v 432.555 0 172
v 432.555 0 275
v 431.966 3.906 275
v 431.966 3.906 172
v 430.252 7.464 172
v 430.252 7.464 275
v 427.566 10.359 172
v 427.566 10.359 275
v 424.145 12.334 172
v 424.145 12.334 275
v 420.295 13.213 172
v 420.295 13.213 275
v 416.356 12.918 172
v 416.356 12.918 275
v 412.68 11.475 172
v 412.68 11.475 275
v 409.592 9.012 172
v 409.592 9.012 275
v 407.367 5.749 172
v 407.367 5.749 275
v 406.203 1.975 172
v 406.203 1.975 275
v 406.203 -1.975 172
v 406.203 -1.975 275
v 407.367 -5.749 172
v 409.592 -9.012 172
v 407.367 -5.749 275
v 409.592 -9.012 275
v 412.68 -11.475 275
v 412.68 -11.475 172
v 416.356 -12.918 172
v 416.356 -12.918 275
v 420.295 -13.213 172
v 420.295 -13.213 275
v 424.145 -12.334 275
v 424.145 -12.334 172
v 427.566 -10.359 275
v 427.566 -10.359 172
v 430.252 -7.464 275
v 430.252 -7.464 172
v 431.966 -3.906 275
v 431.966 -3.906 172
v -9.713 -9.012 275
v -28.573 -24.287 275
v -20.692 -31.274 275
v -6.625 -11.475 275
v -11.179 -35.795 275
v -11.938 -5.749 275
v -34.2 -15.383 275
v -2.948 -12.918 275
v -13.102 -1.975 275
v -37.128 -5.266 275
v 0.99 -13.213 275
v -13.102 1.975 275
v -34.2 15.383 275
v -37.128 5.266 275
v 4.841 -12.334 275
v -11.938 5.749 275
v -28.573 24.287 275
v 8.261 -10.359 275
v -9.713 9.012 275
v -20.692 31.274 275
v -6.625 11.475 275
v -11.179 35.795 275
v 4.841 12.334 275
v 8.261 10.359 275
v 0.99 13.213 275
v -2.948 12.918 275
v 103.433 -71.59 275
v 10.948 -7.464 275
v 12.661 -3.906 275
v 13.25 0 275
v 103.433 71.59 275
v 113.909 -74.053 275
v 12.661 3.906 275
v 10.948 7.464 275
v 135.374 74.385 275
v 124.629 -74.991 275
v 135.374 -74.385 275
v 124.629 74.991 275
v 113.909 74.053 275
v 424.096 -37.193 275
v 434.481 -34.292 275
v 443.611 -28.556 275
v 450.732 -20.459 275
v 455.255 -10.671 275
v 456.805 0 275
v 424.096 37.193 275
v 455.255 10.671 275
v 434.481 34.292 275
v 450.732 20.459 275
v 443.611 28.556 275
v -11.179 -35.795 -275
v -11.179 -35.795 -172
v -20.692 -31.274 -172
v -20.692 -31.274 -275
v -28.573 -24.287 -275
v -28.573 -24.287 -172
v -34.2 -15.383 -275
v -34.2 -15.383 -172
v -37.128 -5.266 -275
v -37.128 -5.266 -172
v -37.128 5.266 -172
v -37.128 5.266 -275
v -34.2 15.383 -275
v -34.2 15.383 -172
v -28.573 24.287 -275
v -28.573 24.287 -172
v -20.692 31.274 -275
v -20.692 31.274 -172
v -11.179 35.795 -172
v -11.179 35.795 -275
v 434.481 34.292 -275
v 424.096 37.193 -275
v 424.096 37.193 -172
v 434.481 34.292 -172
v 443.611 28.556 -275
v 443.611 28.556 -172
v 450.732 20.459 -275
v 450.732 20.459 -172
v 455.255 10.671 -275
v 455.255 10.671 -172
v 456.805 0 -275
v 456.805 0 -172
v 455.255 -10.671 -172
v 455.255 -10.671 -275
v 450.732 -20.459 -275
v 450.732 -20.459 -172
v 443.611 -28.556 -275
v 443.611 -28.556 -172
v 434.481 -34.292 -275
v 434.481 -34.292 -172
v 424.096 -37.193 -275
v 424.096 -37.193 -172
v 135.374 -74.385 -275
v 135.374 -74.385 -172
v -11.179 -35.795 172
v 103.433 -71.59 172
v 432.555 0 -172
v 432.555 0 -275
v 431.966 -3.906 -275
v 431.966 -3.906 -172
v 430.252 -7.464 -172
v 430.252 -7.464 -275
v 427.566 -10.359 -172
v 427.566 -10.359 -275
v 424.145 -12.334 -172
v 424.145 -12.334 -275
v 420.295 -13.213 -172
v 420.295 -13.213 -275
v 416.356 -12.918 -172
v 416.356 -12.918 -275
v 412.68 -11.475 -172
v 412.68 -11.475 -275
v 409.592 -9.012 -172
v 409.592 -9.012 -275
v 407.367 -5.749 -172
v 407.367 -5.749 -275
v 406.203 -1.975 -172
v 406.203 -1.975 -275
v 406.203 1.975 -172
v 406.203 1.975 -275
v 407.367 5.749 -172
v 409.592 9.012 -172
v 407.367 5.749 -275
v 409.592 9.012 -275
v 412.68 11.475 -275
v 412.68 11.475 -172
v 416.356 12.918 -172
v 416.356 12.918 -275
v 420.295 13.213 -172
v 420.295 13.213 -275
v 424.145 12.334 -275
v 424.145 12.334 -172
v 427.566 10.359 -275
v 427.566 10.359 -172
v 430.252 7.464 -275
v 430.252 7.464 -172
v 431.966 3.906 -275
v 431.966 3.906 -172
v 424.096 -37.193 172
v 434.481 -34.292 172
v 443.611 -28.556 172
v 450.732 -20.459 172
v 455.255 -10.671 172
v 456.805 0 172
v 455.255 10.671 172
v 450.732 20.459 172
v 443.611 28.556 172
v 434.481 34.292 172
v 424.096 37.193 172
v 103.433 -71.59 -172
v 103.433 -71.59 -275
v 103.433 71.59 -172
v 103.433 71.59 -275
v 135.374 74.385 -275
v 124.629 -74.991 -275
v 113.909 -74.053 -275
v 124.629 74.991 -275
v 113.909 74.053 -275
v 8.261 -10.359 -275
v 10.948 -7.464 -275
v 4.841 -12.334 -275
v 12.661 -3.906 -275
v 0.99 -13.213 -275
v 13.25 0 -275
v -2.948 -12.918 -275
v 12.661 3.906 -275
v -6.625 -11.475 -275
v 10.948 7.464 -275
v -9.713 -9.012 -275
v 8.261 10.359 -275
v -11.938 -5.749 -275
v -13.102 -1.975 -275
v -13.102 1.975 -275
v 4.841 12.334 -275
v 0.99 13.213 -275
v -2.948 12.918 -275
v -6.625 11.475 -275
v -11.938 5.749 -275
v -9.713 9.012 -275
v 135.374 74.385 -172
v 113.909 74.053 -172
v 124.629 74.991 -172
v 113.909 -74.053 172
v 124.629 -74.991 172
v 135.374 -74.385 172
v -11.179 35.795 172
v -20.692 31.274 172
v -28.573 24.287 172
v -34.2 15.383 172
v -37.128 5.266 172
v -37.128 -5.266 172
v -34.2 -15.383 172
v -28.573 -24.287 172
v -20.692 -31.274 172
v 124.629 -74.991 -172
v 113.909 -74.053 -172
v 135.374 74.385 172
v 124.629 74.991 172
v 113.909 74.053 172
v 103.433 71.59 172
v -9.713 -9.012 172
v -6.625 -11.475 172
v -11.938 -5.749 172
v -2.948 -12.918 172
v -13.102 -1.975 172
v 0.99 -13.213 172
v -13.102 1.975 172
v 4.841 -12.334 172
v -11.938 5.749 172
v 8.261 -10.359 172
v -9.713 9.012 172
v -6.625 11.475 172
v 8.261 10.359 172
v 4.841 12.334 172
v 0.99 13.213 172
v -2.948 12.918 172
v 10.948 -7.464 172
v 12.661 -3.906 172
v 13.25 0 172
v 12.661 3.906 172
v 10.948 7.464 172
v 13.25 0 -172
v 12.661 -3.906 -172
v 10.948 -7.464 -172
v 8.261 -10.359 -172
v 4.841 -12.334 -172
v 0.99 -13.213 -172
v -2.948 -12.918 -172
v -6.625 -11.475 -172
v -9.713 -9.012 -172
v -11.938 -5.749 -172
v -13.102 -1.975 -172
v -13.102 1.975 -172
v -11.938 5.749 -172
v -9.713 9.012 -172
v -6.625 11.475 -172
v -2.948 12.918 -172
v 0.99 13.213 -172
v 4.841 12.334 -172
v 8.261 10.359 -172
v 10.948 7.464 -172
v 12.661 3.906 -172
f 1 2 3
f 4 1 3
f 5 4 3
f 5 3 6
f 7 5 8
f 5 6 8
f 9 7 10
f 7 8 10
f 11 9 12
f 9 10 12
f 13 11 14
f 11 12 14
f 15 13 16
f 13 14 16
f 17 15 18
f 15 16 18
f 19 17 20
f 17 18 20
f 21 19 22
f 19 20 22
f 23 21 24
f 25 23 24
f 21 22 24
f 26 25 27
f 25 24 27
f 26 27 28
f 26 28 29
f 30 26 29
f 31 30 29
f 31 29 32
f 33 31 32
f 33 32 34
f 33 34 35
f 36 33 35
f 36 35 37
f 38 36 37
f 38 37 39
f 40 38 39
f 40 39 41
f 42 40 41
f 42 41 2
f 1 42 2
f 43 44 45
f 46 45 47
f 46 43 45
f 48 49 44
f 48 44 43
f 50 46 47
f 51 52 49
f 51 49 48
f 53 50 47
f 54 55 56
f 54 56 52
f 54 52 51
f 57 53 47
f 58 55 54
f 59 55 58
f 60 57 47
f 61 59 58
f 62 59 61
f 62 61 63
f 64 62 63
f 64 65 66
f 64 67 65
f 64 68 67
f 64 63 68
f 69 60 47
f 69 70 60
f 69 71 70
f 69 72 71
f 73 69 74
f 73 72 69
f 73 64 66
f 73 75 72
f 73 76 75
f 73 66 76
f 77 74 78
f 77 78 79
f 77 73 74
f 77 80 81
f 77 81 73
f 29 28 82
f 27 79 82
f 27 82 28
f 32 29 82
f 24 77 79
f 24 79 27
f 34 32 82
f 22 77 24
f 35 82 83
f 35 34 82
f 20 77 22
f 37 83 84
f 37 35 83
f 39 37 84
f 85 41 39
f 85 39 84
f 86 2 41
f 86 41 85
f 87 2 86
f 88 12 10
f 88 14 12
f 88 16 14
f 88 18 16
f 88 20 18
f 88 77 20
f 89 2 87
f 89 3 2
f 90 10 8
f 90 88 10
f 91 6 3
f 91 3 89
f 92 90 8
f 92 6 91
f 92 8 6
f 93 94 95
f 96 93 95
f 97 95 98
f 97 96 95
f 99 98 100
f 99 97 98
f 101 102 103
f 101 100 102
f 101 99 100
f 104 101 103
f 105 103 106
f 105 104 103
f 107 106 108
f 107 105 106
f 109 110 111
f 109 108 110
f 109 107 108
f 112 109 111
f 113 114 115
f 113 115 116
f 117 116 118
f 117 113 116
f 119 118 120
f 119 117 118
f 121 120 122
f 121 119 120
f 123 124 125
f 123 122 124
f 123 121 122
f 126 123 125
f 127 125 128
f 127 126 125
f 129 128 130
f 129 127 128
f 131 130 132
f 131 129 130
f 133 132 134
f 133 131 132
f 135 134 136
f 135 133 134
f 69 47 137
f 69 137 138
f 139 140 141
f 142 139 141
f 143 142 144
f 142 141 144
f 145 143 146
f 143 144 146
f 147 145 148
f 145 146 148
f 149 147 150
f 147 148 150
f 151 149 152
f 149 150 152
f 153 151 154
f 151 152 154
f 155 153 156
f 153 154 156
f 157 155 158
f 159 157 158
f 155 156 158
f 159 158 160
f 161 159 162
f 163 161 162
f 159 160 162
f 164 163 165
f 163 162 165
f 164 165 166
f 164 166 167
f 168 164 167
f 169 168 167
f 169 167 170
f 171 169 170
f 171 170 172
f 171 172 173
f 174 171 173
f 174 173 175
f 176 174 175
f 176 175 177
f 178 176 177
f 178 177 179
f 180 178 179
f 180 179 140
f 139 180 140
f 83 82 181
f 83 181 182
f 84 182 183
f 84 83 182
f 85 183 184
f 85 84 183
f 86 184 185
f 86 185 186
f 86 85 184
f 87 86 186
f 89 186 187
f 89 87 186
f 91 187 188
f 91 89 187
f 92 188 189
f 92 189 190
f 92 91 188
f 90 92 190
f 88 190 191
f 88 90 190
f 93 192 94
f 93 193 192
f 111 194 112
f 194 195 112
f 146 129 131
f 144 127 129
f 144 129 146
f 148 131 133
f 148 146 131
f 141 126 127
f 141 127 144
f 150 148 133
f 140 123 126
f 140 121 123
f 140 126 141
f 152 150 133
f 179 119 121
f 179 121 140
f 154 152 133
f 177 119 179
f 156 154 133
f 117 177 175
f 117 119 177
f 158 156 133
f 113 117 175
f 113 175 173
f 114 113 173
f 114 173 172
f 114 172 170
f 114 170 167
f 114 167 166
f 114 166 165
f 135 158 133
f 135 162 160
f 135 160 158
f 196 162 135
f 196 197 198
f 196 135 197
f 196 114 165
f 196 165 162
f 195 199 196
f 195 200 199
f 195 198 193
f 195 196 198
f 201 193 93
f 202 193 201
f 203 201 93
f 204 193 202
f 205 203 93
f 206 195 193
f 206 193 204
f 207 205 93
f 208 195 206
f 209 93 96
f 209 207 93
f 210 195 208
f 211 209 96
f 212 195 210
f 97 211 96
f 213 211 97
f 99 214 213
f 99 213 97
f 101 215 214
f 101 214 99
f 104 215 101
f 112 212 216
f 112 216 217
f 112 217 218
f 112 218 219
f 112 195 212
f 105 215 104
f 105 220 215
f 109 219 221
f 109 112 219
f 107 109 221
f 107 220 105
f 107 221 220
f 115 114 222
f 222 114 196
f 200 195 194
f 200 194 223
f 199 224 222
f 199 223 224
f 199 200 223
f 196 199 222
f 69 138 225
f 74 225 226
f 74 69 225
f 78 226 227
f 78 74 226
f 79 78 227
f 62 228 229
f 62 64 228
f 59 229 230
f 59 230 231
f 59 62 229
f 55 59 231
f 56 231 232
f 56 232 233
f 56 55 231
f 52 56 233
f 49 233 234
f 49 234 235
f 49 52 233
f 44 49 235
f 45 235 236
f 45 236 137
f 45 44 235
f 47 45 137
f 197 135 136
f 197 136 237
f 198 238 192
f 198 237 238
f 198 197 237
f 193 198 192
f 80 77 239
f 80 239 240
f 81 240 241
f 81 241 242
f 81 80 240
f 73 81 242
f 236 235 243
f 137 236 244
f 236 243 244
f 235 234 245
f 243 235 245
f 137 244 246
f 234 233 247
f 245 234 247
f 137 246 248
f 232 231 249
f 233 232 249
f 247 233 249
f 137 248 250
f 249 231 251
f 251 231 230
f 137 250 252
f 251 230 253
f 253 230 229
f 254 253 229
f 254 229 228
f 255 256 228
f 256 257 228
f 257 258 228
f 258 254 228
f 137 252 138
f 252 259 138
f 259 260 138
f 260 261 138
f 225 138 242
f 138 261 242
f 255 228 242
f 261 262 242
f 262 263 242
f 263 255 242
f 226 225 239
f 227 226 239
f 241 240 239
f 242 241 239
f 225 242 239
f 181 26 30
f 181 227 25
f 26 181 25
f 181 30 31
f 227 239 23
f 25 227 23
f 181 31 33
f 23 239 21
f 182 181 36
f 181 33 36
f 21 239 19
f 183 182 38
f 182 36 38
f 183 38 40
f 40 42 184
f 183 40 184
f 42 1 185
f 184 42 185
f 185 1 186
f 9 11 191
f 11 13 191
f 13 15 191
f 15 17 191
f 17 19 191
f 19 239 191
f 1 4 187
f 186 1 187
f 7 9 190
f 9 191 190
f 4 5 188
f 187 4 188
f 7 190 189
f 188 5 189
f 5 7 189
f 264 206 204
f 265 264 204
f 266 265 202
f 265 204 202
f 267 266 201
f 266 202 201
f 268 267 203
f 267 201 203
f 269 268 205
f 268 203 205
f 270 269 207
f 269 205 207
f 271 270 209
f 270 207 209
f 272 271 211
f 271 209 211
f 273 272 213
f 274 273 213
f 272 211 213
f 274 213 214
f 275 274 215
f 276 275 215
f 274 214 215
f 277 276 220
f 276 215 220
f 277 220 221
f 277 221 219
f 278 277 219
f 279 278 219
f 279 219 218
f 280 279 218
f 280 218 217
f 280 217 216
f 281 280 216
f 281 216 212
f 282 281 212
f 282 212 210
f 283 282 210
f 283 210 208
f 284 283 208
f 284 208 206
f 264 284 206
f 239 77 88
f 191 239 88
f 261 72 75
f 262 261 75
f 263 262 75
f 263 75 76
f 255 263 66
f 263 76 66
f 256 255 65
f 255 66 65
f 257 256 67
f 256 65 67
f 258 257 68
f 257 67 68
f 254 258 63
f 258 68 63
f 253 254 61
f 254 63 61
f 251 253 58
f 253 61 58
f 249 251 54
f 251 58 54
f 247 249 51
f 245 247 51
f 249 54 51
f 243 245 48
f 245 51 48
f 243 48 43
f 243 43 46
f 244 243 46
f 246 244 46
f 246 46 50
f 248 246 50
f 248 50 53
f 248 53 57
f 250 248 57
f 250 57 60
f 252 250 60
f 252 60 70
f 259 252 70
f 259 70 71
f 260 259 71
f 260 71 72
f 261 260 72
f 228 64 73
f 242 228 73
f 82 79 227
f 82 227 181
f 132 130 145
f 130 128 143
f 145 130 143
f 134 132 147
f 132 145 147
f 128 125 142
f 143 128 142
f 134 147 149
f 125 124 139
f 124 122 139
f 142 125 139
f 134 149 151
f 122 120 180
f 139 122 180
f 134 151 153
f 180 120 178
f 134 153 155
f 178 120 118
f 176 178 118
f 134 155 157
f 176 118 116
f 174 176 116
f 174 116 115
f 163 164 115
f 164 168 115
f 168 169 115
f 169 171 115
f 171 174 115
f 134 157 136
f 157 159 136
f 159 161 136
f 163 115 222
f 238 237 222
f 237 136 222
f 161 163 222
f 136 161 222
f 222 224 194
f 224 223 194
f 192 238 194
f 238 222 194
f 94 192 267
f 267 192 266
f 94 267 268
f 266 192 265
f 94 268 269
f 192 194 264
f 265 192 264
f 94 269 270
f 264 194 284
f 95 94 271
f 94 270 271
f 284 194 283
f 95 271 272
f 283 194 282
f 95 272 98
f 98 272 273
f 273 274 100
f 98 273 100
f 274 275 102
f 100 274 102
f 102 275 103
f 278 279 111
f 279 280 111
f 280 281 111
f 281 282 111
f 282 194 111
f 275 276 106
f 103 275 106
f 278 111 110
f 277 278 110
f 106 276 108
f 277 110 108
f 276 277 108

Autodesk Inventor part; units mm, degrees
ref_plane "YZ Plane" through (0, 0, 0) normal (1, 0, 0) x (0, 1, 0)
ref_plane "XZ Plane" through (0, 0, 0) normal (0, 1, 0) x (-1, 0, 0)
ref_plane "工作平面1" through (0, 0, 275) normal (0, 0, 1) x (1, 0, 0)
sketch "草圖1" plane through (0, 0, 275) normal (0, 0, 1) x (1, 0, 0)
  line L0 (0, 0) -> (419.3047, 0) construction
  arc A0 (-11.1792, 35.7949) -> (-11.1792, -35.7949) centre (0, 0) ccw
  arc A1 (424.0958, -37.1927) -> (424.0958, 37.1927) centre (419.3047, 0) ccw
  line L1 (-11.1792, -35.7949) -> (103.433, -71.5898)
  line L2 (135.3736, 74.3854) -> (424.0958, 37.1927)
  line L3 (-11.1792, 35.7949) -> (103.433, 71.5898)
  line L4 (135.3736, -74.3854) -> (424.0958, -37.1927)
  arc A2 (103.433, -71.5898) -> (135.3736, -74.3854) centre (125.7914, 0) ccw
  arc A3 (135.3736, 74.3854) -> (103.433, 71.5898) centre (125.7914, 0) ccw
  dimension "d3" = 419.3047
  dimension "d4" = 75
  dimension "d6" = 75
  dimension "d51" = 125.7914
  dimension "d52" = 75
extrude "擠出1" add sketch "草圖1" against normal blind 103
sketch "草圖2" plane through (0, 0, 275) normal (0, 0, 1) x (1, 0, 0)
  arc A0 (-11.1792, 35.7949) -> (-11.1792, -35.7949) centre (0, 0) ccw projected
  circle A1 centre (0, 0) radius 13.25
  arc A2 (424.0958, -37.1927) -> (424.0958, 37.1927) centre (419.3047, 0) ccw projected
  circle A3 centre (419.3047, 0) radius 13.25
  point P0 (-10.9663, -35.8607)
  point P1 (-34.5251, 14.6378)
  point P2 (141.4214, 141.4214)
  point P3 (444.0649, 33.6154)
  point P4 (432.144, -37.2043)
  dimension "d11" = 26.5
  dimension "d13" = 26.5
extrude "擠出2" cut sketch "草圖2" against normal through all
sketch "草圖3" plane through (434.4748, 35.8557, 275) normal (0.1277625, 0.9918048, 0) x (0.9918048, -0.1277625, 0)
  line L0 (-10.4648, 0) -> (-10.4648, 103) projected
  point P0 (-426.3332, 275)
  point P1 (-10.4648, 51.5)
  point P2 (-10.4648, 51.5)
hole "孔1" [suppressed]
sketch "草圖4" plane through (51.2031, 55.2777, 275) normal (-0.2981126, 0.9545307, 0) x (0.9545307, 0.2981126, 0)
  line L0 (-65.3539, 0) -> (-65.3539, 103) projected
  point P0 (-65.3539, 275)
  point P1 (-65.3539, 51.5)
  point P2 (-65.3539, 51.5)
hole "孔2" [suppressed]
sketch "草圖6" plane through (-11.1792, -35.7949, 172) normal (-0.2981126, -0.9545307, 0) x (0.9545307, -0.2981126, 0)
  line L0 (0, 51.5) -> (0, 0) projected
  point P0 (0, -172)
  point P1 (0, 25.75)
hole "孔4" [suppressed]
sketch "草圖7" plane through (135.3736, -74.3854, 172) normal (0.1277625, -0.9918048, 0) x (0.9918048, 0.1277625, 0)
  line L0 (296.8516, 51.5) -> (296.8516, 0) projected
  point P0 (-124.7605, -172)
  point P1 (296.8516, 25.75)
hole "孔5" [suppressed]
mirror "鏡射1" about plane through (0, 0, 0) normal (0, 0, 1) of "擠出1", "擠出2"
equation "\"d3\" = R5"
equation "\"d51\" = 0.3 * R5"
equation "\"R5\" = T1A_R5"
equation "\"th5a\" = T1A_th5a"
equation "\"d0\" = 0.5 * Width"
equation "\"T1A_R5\" = 419.3047"
equation "\"T1A_th5a\" = 45deg"
equation "\"T1A_R1\" = 585.5331"
equation "\"T1A_R3\" = 252.3048"
equation "\"T1A_R4\" = 320.6953"
equation "\"T1A_R7\" = -221.7475"
equation "\"T1A_R8\" = 369.2781"
equation "\"T1A_R1_Width\" = 756"
equation "\"T1A_R2_Width\" = 756"
equation "\"T1A_R3_Width\" = 344"
equation "\"T1A_R4_Width\" = 756"
equation "\"T1A_Joint_Width\" = 756"
equation "\"Width\" = 550"
properties part number "Type 1A R5主滑台連接桿:1" material "密度7850的鋼"
